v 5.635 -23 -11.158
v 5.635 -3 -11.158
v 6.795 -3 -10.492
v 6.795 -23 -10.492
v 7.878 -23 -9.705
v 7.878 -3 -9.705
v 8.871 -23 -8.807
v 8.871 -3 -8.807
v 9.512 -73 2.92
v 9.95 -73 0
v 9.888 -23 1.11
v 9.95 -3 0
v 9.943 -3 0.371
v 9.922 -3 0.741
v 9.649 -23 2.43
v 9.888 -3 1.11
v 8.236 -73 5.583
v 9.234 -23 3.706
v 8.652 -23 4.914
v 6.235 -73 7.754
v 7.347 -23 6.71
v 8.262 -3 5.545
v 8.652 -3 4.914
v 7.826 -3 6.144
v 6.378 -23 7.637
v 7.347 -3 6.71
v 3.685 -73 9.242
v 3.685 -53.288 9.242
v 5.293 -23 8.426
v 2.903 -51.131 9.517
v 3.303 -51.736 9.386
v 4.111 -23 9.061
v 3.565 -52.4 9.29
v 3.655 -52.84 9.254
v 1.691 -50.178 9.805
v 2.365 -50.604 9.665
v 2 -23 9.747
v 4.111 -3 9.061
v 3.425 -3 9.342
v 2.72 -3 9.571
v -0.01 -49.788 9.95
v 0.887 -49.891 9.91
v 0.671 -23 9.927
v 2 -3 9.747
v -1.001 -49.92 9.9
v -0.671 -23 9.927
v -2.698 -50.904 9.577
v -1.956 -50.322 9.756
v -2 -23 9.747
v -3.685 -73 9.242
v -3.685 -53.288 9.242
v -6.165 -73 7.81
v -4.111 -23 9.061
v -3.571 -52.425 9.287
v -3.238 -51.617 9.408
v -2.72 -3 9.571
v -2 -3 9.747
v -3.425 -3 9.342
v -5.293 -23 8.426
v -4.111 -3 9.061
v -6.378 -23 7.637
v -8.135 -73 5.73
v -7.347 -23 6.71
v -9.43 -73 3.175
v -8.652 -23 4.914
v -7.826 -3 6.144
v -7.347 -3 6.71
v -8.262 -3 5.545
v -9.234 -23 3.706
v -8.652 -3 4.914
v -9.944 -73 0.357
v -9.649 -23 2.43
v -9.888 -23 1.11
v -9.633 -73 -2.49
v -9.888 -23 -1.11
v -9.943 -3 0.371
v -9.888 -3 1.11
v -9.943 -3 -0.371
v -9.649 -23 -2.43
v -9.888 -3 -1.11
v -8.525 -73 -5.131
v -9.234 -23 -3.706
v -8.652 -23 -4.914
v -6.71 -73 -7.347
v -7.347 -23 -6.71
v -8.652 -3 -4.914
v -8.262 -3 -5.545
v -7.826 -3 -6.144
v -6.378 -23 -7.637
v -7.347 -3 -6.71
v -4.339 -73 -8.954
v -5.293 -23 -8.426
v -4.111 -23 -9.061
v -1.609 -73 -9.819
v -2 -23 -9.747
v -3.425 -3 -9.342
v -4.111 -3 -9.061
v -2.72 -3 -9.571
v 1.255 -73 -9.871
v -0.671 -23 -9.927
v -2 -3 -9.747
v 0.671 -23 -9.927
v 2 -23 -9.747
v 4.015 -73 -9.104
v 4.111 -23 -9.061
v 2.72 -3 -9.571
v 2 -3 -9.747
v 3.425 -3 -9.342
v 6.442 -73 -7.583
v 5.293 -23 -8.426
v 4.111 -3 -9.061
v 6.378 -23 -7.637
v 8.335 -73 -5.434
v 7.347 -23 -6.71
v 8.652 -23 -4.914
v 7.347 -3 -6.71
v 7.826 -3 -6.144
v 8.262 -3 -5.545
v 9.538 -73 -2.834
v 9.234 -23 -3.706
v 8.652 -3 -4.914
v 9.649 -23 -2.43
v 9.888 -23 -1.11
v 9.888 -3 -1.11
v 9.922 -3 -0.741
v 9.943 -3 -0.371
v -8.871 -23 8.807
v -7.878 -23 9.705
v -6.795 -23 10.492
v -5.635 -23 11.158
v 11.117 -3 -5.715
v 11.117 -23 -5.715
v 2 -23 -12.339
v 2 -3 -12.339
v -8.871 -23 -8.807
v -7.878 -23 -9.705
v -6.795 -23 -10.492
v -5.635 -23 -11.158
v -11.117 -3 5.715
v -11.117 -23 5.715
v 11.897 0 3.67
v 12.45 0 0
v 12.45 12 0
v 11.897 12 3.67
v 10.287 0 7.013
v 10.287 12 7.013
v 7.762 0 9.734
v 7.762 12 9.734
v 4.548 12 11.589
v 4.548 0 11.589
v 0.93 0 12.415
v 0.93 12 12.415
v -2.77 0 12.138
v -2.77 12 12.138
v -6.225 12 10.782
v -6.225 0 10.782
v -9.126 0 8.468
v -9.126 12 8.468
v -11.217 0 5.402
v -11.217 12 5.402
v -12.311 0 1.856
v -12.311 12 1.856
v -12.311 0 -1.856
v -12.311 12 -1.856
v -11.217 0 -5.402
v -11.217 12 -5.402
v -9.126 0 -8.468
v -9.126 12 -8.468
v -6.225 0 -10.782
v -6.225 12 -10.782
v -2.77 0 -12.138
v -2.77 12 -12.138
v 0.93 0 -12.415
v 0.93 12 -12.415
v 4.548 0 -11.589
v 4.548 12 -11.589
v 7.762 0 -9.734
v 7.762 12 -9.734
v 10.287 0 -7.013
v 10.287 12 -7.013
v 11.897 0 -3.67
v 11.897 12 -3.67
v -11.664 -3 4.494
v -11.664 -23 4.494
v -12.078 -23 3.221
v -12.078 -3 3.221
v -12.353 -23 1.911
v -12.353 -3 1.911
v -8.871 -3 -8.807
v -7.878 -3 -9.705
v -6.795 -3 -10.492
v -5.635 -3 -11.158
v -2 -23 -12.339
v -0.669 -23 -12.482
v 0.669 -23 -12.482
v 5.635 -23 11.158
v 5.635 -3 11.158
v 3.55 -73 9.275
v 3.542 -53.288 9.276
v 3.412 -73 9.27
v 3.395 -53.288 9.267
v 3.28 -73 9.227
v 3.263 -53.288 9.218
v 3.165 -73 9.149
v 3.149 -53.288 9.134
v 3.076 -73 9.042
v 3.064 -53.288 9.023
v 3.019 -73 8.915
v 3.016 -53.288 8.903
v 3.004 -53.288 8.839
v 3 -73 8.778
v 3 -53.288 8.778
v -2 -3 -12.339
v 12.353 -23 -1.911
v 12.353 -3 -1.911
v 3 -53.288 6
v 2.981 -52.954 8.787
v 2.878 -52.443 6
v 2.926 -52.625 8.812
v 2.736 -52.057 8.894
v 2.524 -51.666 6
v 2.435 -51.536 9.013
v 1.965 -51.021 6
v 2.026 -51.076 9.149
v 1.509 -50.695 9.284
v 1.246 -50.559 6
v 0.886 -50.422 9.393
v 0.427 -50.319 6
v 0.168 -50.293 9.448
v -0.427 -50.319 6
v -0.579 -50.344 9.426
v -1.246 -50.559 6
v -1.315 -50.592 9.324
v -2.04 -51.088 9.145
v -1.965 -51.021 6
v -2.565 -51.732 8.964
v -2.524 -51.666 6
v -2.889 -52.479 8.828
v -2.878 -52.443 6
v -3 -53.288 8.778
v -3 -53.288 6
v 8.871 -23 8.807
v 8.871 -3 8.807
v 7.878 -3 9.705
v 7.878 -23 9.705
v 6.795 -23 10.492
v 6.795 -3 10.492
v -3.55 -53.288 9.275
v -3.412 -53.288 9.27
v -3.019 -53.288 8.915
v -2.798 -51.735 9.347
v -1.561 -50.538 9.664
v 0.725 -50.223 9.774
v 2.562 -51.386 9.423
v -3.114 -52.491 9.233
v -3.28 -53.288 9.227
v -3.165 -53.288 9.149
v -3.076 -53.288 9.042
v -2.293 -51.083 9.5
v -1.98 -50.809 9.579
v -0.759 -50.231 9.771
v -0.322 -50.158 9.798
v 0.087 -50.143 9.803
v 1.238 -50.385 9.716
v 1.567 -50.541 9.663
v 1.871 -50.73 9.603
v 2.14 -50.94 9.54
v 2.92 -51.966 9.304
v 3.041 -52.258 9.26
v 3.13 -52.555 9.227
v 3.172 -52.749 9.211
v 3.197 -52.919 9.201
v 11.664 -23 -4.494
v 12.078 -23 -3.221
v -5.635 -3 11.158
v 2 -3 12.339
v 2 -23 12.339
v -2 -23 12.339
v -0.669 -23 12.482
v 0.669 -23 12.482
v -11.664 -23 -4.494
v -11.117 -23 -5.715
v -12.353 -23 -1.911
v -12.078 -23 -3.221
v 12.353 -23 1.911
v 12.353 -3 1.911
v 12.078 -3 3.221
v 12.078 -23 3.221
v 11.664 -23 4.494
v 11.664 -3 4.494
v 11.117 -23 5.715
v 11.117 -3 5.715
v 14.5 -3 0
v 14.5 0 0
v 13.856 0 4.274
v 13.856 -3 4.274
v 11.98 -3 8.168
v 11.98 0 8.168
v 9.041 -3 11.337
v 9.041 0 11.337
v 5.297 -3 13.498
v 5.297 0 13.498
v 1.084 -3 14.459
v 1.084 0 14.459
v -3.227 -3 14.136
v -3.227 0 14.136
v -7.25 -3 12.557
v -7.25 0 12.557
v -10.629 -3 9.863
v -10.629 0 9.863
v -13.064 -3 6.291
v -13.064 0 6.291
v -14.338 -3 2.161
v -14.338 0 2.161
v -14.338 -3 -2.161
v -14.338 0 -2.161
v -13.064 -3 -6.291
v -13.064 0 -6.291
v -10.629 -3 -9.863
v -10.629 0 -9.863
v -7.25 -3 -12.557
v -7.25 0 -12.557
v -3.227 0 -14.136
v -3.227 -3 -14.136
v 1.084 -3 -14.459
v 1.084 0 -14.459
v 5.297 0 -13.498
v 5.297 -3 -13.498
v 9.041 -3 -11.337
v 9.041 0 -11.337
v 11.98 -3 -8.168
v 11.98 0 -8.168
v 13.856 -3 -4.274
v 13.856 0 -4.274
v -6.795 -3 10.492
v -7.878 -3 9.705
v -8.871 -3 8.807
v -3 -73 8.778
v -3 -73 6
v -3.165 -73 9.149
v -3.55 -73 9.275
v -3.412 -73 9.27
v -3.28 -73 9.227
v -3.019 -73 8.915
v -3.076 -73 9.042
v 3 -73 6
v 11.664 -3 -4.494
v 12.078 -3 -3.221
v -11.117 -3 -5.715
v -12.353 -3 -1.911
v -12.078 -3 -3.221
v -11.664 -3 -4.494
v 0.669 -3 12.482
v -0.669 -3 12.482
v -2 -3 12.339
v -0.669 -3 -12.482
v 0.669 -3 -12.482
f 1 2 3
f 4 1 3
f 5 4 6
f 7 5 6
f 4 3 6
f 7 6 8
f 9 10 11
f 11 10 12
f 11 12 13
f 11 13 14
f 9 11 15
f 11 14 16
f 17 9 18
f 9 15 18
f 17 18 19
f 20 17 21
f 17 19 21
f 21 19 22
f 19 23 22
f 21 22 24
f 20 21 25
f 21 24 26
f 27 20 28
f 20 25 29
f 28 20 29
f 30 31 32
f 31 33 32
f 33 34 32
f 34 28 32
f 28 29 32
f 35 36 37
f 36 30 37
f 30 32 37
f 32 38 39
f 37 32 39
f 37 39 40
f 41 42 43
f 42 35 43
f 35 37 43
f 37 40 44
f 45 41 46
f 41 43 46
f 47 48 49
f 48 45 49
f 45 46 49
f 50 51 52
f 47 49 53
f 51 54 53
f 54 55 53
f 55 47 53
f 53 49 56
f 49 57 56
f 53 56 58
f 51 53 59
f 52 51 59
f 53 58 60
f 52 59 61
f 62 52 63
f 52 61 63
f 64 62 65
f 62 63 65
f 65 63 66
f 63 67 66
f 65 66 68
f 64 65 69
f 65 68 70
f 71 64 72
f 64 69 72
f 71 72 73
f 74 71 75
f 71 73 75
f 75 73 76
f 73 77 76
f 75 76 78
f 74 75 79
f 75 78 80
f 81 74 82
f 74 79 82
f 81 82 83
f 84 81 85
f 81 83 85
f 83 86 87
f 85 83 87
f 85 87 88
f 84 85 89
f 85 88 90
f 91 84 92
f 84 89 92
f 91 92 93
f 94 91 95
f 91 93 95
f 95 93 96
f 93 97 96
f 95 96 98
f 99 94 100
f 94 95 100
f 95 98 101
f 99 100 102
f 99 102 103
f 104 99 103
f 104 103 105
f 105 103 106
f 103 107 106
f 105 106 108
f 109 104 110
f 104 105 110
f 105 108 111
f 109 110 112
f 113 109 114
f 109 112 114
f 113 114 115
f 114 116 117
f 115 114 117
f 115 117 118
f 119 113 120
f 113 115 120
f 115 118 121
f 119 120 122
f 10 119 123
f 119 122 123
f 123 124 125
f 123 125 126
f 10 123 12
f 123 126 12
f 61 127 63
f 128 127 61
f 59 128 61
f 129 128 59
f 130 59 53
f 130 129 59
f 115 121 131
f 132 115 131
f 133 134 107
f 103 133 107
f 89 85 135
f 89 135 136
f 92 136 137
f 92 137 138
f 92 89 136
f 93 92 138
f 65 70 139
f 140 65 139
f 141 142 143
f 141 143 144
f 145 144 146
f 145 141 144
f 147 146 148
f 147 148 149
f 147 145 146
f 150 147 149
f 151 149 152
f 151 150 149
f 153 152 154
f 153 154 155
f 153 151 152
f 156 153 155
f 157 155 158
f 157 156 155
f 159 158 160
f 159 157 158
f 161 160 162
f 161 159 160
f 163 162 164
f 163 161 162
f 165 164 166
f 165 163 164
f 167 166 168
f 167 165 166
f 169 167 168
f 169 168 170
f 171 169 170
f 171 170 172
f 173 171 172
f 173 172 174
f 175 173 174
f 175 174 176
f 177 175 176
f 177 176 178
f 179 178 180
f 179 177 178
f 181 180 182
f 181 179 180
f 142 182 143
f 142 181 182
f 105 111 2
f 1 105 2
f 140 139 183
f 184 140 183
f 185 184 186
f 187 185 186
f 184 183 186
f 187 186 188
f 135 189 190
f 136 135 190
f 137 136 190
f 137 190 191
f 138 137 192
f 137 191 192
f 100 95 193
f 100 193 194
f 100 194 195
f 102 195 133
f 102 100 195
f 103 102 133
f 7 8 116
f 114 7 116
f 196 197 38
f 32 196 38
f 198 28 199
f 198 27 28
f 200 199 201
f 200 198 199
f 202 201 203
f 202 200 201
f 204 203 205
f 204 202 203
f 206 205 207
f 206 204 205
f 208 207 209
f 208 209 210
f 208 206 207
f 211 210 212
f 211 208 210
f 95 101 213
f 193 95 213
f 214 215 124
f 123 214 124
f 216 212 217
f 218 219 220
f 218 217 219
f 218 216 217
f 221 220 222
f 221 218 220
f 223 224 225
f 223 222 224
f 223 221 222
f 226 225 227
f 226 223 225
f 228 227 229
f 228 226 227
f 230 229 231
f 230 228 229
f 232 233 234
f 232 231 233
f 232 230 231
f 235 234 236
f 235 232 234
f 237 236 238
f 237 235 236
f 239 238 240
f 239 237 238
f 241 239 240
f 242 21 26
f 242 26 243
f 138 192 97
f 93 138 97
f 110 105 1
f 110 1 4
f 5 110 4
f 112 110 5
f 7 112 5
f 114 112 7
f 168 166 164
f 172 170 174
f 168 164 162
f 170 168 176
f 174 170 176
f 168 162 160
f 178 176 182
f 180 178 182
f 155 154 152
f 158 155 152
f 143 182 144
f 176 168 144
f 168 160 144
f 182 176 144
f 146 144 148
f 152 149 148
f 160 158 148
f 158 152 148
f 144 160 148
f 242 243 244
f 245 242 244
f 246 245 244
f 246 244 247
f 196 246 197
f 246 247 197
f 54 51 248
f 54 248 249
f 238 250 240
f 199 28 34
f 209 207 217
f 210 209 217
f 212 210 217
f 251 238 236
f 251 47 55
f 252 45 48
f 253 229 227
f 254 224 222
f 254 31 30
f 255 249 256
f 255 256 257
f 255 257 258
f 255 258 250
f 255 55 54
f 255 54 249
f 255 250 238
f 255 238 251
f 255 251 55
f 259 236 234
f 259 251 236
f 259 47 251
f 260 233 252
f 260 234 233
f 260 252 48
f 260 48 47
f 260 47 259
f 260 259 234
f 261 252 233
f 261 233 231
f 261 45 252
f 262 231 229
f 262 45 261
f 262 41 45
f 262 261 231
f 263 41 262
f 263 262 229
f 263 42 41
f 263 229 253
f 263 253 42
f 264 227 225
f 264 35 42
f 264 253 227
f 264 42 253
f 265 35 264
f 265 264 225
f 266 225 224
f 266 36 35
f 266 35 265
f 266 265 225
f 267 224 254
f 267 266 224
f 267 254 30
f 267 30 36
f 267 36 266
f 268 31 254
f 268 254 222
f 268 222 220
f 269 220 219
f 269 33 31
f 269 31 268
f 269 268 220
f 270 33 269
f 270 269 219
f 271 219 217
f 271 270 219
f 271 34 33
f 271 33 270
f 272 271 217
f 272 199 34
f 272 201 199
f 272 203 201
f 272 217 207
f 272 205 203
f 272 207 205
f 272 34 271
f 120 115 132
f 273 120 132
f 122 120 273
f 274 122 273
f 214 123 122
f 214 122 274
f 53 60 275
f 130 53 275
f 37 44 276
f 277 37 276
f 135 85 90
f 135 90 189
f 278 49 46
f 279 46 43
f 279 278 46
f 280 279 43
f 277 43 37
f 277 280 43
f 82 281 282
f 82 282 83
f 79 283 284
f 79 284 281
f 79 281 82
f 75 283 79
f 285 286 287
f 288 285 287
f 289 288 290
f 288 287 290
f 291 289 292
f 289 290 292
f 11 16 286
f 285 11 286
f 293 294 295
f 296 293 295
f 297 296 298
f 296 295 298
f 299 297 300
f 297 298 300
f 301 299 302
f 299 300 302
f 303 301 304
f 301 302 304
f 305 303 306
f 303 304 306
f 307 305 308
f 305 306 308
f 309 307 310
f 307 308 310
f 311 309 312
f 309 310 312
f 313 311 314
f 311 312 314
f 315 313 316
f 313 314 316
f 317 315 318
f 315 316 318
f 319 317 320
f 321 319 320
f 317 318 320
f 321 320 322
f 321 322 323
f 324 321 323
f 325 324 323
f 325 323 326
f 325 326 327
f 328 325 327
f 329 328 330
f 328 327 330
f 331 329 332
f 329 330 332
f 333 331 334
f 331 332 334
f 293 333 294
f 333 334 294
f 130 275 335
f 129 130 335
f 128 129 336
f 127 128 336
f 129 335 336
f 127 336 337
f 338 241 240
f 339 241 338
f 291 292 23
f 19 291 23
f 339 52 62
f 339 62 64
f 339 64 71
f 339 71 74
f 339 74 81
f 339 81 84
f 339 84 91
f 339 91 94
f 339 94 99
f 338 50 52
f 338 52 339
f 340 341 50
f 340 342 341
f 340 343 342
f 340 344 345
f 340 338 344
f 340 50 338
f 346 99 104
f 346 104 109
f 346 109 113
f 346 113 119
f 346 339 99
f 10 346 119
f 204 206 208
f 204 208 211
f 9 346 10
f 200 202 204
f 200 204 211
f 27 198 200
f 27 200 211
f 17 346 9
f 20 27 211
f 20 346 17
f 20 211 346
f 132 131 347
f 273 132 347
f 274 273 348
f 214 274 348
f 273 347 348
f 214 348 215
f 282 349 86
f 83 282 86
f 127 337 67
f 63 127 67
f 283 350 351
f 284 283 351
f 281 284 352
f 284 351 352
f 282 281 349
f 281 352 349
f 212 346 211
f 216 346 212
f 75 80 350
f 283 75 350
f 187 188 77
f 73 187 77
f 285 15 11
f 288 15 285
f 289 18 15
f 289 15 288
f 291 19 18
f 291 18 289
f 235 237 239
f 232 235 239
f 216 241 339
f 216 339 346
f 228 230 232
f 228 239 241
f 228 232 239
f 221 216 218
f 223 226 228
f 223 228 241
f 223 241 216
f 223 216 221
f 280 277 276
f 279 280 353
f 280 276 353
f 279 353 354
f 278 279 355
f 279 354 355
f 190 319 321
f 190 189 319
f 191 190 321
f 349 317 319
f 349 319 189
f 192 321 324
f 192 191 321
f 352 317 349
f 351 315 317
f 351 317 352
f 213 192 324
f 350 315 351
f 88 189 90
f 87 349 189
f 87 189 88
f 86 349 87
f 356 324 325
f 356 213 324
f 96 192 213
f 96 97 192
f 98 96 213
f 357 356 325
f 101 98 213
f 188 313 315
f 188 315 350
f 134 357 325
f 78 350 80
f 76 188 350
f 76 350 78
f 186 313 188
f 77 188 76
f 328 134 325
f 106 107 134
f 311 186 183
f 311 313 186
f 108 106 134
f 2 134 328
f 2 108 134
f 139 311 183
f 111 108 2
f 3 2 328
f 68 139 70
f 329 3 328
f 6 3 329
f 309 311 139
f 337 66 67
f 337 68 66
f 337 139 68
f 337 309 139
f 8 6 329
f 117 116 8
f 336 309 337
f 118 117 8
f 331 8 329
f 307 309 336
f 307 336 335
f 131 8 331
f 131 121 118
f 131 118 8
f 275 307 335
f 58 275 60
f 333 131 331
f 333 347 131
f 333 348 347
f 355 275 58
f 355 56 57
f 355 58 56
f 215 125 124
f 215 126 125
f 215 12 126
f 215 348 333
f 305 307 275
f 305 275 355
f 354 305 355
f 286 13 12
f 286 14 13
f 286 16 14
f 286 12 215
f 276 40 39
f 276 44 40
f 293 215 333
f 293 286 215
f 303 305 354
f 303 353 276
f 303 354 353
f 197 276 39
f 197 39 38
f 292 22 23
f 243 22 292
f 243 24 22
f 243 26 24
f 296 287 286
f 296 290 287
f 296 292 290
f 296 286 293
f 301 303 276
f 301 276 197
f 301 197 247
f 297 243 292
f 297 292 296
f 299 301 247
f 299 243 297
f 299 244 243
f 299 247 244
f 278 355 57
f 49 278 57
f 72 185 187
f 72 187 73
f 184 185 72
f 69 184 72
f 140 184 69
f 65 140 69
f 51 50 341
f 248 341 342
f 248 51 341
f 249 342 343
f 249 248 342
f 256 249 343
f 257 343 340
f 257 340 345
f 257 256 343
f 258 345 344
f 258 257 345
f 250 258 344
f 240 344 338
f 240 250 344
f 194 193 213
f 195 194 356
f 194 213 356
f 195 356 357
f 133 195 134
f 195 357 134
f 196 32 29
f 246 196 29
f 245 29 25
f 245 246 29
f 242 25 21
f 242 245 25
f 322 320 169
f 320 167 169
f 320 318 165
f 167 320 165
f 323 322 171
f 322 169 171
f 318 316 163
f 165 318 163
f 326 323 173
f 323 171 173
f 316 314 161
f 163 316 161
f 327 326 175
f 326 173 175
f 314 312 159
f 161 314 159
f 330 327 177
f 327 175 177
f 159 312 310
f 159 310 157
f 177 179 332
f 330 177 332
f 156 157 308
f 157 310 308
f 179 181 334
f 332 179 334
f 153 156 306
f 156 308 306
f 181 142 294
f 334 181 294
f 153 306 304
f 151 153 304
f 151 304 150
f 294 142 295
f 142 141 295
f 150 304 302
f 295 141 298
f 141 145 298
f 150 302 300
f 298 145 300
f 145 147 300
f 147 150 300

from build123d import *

# Parameters (mm, degrees)
F0_R      = 12.45
F1_DEPTH  = 12
F2_R      = 14.5
F3_DEPTH  = 3
F4_R      = 9.95
F5_DEPTH  = 70
F7_DEPTH  = 20
F10_DEPTH = 25
F11_R     = 0.5


with BuildPart() as f1:
    # F0 (on Front) → F1 (new body)
    with BuildSketch(Plane.XZ):
        Circle(F0_R)
    extrude(amount=-F1_DEPTH)

    # F2 (on Front) → F3 (join)
    with BuildSketch(Plane.XZ):
        Circle(F2_R)
    extrude(amount=F3_DEPTH)

    # F4 (on face) → F5 (join)
    with BuildSketch(Plane.XZ.offset(3)):
        Circle(F4_R)
    extrude(amount=F5_DEPTH)

    # F6 (on face) → F7 (join)
    with BuildSketch(Plane.XZ.offset(3)):
        with BuildLine():
            Line((2, 9.7469225913), (2, 12.3389626793))
            ThreePointArc((2, 12.3389626793), (0, 12.5), (-2, 12.3389626793))
            Line((-2, 12.3389626793), (-2, 9.7469225913))
            ThreePointArc((-2, 9.7469225913), (0, 9.95), (2, 9.7469225913))
        make_face()
        with BuildLine():
            Line((5.6346263027, 11.1580010051), (4.1110633656, 9.0609965238))
            ThreePointArc((4.1110633656, 9.0609965238), (5.8484632603, 8.049719094), (7.3471313431, 6.7098555146))
            Line((7.3471313431, 6.7098555146), (8.8706942802, 8.8068599959))
            ThreePointArc((8.8706942802, 8.8068599959), (7.3473156537, 10.1127124297), (5.6346263027, 11.1580010051))
        make_face()
        with BuildLine():
            Line((11.1170168717, 5.7150621934), (8.6518402555, 4.9140777561))
            ThreePointArc((8.6518402555, 4.9140777561), (9.4630123371, 3.074719094), (9.887908233, 1.109851691))
            Line((9.887908233, 1.109851691), (12.3530848492, 1.9108361283))
            ThreePointArc((12.3530848492, 1.9108361283), (11.8882064537, 3.8627124297), (11.1170168717, 5.7150621934))
        make_face()
        with BuildLine():
            Line((12.3530848492, -1.9108361283), (9.887908233, -1.109851691))
            ThreePointArc((9.887908233, -1.109851691), (9.4630123371, -3.074719094), (8.6518402555, -4.9140777561))
            Line((8.6518402555, -4.9140777561), (11.1170168717, -5.7150621934))
            ThreePointArc((11.1170168717, -5.7150621934), (11.8882064537, -3.8627124297), (12.3530848492, -1.9108361283))
        make_face()
        with BuildLine():
            Line((8.8706942802, -8.8068599959), (7.3471313431, -6.7098555146))
            ThreePointArc((7.3471313431, -6.7098555146), (5.8484632603, -8.049719094), (4.1110633656, -9.0609965238))
            Line((4.1110633656, -9.0609965238), (5.6346263027, -11.1580010051))
            ThreePointArc((5.6346263027, -11.1580010051), (7.3473156537, -10.1127124297), (8.8706942802, -8.8068599959))
        make_face()
        with BuildLine():
            ThreePointArc((2, -9.7469225913), (0, -9.95), (-2, -9.7469225913))
            Line((-2, -9.7469225913), (-2, -12.3389626793))
            ThreePointArc((-2, -12.3389626793), (0, -12.5), (2, -12.3389626793))
            Line((2, -12.3389626793), (2, -9.7469225913))
        make_face()
        with BuildLine():
            ThreePointArc((-4.1110633656, -9.0609965238), (-5.8484632603, -8.049719094), (-7.3471313431, -6.7098555146))
            Line((-7.3471313431, -6.7098555146), (-8.8706942802, -8.8068599959))
            ThreePointArc((-8.8706942802, -8.8068599959), (-7.3473156537, -10.1127124297), (-5.6346263027, -11.1580010051))
            Line((-5.6346263027, -11.1580010051), (-4.1110633656, -9.0609965238))
        make_face()
        with BuildLine():
            ThreePointArc((-8.6518402555, -4.9140777561), (-9.4630123371, -3.074719094), (-9.887908233, -1.109851691))
            Line((-9.887908233, -1.109851691), (-12.3530848492, -1.9108361283))
            ThreePointArc((-12.3530848492, -1.9108361283), (-11.8882064537, -3.8627124297), (-11.1170168717, -5.7150621934))
            Line((-11.1170168717, -5.7150621934), (-8.6518402555, -4.9140777561))
        make_face()
        with BuildLine():
            ThreePointArc((-9.887908233, 1.109851691), (-9.4630123371, 3.074719094), (-8.6518402555, 4.9140777561))
            Line((-8.6518402555, 4.9140777561), (-11.1170168717, 5.7150621934))
            ThreePointArc((-11.1170168717, 5.7150621934), (-11.8882064537, 3.8627124297), (-12.3530848492, 1.9108361283))
            Line((-12.3530848492, 1.9108361283), (-9.887908233, 1.109851691))
        make_face()
        with BuildLine():
            ThreePointArc((-7.3471313431, 6.7098555146), (-5.8484632603, 8.049719094), (-4.1110633656, 9.0609965238))
            Line((-4.1110633656, 9.0609965238), (-5.6346263027, 11.1580010051))
            ThreePointArc((-5.6346263027, 11.1580010051), (-7.3473156537, 10.1127124297), (-8.8706942802, 8.8068599959))
            Line((-8.8706942802, 8.8068599959), (-7.3471313431, 6.7098555146))
        make_face()
    extrude(amount=F7_DEPTH)

    # F9 (on offset) → F10 (cut)
    with BuildSketch(Plane.XY.offset(6)):
        with BuildLine():
            Line((-3, -53.2881170511), (-3, -79.6965509653))
            Line((-3, -79.6965509653), (3, -79.6965509653))
            Line((3, -79.6965509653), (3, -53.2881170511))
            ThreePointArc((3, -53.2881170511), (0, -50.2881170511), (-3, -53.2881170511))
        make_face()
    extrude(amount=F10_DEPTH, mode=Mode.SUBTRACT)

    # F11
    f11_edges = [f1.edges().sort_by_distance(p)[0] for p in [
        (-3, -63.144059, 9.486965),
        (3, -63.144059, 9.486965),
        (0, -50.288117, 9.95),
    ]]
    fillet(f11_edges, radius=F11_R)


solid = f1.part
